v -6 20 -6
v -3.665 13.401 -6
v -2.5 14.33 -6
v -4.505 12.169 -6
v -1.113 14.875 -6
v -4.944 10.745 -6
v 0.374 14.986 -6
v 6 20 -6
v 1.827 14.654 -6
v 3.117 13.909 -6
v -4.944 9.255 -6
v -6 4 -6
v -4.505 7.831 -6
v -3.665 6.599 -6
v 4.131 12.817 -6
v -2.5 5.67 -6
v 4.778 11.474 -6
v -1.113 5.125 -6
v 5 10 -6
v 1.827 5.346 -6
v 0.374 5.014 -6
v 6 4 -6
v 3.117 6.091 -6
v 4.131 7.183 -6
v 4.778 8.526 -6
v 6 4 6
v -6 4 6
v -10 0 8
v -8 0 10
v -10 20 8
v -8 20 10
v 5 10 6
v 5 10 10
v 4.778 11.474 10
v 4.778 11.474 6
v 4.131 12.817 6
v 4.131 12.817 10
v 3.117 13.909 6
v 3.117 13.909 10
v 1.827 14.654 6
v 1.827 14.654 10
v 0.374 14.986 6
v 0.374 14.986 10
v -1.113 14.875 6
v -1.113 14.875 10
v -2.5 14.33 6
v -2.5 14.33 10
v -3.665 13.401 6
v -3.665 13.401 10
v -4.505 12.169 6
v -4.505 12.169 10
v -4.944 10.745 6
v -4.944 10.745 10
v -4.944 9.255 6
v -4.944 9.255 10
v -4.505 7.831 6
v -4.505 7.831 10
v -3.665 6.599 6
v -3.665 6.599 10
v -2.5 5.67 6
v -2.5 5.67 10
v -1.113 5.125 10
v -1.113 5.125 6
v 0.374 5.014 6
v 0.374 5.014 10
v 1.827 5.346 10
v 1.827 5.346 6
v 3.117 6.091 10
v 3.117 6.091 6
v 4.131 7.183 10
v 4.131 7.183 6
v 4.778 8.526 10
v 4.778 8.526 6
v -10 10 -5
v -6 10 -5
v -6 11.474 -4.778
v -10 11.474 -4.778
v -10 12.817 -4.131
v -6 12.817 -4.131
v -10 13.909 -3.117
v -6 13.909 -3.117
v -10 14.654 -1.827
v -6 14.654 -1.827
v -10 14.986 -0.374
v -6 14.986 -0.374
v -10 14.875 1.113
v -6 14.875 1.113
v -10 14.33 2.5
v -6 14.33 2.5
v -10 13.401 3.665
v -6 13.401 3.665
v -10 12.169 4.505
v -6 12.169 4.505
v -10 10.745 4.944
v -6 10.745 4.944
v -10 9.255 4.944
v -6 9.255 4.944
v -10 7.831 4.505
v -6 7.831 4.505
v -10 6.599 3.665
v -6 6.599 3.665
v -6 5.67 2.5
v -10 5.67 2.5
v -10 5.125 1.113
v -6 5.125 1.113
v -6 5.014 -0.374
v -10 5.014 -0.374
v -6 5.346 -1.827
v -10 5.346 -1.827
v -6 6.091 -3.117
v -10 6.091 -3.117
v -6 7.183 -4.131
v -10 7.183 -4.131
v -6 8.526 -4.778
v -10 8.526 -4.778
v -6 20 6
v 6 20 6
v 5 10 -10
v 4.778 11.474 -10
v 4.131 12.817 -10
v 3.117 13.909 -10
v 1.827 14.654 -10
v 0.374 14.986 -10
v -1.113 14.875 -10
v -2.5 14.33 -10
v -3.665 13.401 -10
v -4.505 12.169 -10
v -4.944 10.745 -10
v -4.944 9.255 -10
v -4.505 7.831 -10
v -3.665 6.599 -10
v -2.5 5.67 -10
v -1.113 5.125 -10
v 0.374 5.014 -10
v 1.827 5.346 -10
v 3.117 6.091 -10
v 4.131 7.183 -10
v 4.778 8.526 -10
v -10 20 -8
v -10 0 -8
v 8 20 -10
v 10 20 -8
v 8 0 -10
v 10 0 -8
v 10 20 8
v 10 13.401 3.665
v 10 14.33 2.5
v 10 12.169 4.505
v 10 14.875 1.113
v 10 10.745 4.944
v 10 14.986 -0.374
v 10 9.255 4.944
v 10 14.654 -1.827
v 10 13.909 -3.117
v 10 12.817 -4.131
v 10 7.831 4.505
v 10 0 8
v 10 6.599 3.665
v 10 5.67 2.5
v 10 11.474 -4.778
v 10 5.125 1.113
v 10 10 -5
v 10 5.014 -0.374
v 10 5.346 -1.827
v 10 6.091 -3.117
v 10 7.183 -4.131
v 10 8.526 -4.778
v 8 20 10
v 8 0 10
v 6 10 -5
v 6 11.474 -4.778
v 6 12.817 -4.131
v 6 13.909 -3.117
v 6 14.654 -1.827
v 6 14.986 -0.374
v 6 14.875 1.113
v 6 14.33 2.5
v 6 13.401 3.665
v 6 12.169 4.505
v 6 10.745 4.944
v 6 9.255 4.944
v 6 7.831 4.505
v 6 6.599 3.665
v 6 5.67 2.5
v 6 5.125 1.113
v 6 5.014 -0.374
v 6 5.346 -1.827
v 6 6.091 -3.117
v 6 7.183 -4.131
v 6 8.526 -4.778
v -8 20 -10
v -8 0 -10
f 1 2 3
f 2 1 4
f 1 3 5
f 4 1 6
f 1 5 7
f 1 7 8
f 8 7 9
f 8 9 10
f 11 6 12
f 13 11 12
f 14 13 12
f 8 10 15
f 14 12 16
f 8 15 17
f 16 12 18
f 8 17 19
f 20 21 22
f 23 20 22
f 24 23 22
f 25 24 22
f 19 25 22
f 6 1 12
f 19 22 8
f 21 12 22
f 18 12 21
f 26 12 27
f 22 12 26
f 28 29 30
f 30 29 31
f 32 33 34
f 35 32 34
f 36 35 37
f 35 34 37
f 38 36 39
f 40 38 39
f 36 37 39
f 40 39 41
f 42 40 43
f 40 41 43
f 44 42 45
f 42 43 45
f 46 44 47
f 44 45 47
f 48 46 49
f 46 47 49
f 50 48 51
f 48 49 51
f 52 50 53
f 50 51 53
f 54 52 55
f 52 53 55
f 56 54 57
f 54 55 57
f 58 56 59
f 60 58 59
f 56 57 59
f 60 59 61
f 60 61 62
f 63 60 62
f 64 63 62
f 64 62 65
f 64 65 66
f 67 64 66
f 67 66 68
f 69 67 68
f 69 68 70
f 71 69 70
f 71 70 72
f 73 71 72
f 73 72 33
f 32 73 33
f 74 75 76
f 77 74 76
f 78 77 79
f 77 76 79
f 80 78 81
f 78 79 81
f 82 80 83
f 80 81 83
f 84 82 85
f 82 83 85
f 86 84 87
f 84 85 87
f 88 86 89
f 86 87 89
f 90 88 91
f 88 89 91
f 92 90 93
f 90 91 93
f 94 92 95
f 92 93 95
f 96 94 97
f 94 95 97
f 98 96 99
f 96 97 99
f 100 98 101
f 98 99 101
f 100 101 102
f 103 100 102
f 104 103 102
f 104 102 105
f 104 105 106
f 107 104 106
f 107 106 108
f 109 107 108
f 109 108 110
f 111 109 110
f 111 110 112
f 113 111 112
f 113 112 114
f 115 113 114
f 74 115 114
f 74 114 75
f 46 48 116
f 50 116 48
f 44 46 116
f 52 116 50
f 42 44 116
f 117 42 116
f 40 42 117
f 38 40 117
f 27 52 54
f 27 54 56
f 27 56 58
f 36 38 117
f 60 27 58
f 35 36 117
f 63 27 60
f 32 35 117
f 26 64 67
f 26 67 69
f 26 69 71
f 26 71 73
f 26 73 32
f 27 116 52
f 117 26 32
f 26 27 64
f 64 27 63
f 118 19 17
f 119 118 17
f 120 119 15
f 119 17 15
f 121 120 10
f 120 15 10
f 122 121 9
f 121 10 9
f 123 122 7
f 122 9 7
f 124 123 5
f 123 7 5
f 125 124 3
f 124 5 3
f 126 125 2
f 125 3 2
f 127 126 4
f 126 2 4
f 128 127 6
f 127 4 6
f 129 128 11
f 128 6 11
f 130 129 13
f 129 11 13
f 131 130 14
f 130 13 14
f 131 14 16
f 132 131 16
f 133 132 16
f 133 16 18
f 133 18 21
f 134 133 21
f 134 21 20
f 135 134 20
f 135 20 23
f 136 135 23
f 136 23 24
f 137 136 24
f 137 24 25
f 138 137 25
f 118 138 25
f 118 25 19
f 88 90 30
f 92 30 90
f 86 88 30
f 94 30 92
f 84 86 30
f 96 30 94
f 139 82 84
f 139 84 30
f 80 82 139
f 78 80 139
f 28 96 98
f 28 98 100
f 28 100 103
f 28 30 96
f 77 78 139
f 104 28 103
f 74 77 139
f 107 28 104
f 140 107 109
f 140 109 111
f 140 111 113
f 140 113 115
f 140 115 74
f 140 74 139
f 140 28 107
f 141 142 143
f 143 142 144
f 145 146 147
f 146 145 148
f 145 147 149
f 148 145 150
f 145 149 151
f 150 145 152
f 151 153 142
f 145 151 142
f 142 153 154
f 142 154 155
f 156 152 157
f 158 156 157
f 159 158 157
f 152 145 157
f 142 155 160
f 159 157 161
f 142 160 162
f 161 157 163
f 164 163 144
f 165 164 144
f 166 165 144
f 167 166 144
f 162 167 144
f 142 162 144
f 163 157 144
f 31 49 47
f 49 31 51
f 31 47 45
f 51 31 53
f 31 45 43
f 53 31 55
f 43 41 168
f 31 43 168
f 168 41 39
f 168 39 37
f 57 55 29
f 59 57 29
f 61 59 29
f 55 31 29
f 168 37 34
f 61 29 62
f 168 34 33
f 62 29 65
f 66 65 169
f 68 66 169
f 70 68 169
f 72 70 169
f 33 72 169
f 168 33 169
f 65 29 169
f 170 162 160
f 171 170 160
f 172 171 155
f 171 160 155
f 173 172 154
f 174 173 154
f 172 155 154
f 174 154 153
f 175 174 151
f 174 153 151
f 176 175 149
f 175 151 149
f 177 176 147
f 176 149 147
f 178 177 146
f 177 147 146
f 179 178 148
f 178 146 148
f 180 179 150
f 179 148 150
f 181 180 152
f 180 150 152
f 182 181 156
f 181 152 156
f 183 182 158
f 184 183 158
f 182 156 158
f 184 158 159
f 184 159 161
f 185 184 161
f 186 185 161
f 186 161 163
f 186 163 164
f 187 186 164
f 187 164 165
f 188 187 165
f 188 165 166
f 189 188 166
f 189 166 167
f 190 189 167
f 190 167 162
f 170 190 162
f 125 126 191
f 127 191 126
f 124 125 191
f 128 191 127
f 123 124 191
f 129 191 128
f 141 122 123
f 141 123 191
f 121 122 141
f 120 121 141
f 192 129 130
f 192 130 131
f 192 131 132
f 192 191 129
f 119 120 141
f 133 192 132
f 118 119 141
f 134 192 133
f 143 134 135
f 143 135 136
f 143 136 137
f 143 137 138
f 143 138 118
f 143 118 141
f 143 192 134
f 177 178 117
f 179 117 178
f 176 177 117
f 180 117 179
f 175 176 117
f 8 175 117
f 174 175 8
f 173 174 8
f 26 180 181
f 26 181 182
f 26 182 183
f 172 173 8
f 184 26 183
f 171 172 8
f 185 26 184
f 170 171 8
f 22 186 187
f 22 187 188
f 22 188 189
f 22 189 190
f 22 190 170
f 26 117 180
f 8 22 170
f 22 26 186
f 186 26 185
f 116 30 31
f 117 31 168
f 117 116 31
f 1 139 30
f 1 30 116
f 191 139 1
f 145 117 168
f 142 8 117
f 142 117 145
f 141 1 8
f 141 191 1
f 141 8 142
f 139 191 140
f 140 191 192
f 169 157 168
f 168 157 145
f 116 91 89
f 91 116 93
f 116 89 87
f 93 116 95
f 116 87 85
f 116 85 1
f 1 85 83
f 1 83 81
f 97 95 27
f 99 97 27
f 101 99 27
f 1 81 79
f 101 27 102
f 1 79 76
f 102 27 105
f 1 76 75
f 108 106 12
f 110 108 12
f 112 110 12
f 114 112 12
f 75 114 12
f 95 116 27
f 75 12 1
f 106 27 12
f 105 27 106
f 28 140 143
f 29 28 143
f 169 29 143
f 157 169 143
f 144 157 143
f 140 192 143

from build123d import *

# Parameters (mm, degrees)
ESQUISSE1_W             = 20
ESQUISSE1_H             = 20
BOSS_EXTRU_1_DEPTH      = 4
ESQUISSE4_W             = 20
ESQUISSE4_H             = 20
ESQUISSE4_W_2           = 12
ESQUISSE4_H_2           = 12
BOSS_EXTRU_2_DEPTH      = 16
ESQUISSE6_R             = 5
ENL_V_MAT_EXTRU_3_DEPTH = 25
ESQUISSE5_R             = 5
ENL_V_MAT_EXTRU_4_DEPTH = 25
CHANFREIN1_SIZE         = 2


with BuildPart() as part:
    # Esquisse1 → Boss.-Extru.1 (new body)
    with BuildSketch(Plane(origin=(0, 0, 0), x_dir=(1, 0, 0), z_dir=(0, 1, 0))):
        Rectangle(ESQUISSE1_W, ESQUISSE1_H)
    extrude(amount=BOSS_EXTRU_1_DEPTH)

    # Esquisse4 → Boss.-Extru.2 (add)
    with BuildSketch(Plane(origin=(0, 4, 0), x_dir=(1, 0, 0), z_dir=(0, 1, 0))):
        Rectangle(ESQUISSE4_W, ESQUISSE4_H)
        Rectangle(ESQUISSE4_W_2, ESQUISSE4_H_2, mode=Mode.SUBTRACT)
    extrude(amount=BOSS_EXTRU_2_DEPTH)

    # Esquisse6 → Enlèv. mat.-Extru.3 (cut)
    with BuildSketch(Plane(origin=(10, 0, 0), x_dir=(0, 0, -1), z_dir=(1, 0, 0))):
        with Locations((0, 10)):
            Circle(ESQUISSE6_R)
    extrude(amount=-ENL_V_MAT_EXTRU_3_DEPTH, mode=Mode.SUBTRACT)

    # Esquisse5 → Enlèv. mat.-Extru.4 (cut)
    with BuildSketch(Plane.XY.offset(10)):
        with Locations((0, 10)):
            Circle(ESQUISSE5_R)
    extrude(amount=-ENL_V_MAT_EXTRU_4_DEPTH, mode=Mode.SUBTRACT)

    # Chanfrein1
    chanfrein1_edges = [part.edges().sort_by_distance(p)[0] for p in [
        (10, 10, -10),
        (10, 10, 10),
        (-10, 10, 10),
        (-10, 10, -10),
    ]]
    chamfer(chanfrein1_edges, length=CHANFREIN1_SIZE)


solid = part.part
